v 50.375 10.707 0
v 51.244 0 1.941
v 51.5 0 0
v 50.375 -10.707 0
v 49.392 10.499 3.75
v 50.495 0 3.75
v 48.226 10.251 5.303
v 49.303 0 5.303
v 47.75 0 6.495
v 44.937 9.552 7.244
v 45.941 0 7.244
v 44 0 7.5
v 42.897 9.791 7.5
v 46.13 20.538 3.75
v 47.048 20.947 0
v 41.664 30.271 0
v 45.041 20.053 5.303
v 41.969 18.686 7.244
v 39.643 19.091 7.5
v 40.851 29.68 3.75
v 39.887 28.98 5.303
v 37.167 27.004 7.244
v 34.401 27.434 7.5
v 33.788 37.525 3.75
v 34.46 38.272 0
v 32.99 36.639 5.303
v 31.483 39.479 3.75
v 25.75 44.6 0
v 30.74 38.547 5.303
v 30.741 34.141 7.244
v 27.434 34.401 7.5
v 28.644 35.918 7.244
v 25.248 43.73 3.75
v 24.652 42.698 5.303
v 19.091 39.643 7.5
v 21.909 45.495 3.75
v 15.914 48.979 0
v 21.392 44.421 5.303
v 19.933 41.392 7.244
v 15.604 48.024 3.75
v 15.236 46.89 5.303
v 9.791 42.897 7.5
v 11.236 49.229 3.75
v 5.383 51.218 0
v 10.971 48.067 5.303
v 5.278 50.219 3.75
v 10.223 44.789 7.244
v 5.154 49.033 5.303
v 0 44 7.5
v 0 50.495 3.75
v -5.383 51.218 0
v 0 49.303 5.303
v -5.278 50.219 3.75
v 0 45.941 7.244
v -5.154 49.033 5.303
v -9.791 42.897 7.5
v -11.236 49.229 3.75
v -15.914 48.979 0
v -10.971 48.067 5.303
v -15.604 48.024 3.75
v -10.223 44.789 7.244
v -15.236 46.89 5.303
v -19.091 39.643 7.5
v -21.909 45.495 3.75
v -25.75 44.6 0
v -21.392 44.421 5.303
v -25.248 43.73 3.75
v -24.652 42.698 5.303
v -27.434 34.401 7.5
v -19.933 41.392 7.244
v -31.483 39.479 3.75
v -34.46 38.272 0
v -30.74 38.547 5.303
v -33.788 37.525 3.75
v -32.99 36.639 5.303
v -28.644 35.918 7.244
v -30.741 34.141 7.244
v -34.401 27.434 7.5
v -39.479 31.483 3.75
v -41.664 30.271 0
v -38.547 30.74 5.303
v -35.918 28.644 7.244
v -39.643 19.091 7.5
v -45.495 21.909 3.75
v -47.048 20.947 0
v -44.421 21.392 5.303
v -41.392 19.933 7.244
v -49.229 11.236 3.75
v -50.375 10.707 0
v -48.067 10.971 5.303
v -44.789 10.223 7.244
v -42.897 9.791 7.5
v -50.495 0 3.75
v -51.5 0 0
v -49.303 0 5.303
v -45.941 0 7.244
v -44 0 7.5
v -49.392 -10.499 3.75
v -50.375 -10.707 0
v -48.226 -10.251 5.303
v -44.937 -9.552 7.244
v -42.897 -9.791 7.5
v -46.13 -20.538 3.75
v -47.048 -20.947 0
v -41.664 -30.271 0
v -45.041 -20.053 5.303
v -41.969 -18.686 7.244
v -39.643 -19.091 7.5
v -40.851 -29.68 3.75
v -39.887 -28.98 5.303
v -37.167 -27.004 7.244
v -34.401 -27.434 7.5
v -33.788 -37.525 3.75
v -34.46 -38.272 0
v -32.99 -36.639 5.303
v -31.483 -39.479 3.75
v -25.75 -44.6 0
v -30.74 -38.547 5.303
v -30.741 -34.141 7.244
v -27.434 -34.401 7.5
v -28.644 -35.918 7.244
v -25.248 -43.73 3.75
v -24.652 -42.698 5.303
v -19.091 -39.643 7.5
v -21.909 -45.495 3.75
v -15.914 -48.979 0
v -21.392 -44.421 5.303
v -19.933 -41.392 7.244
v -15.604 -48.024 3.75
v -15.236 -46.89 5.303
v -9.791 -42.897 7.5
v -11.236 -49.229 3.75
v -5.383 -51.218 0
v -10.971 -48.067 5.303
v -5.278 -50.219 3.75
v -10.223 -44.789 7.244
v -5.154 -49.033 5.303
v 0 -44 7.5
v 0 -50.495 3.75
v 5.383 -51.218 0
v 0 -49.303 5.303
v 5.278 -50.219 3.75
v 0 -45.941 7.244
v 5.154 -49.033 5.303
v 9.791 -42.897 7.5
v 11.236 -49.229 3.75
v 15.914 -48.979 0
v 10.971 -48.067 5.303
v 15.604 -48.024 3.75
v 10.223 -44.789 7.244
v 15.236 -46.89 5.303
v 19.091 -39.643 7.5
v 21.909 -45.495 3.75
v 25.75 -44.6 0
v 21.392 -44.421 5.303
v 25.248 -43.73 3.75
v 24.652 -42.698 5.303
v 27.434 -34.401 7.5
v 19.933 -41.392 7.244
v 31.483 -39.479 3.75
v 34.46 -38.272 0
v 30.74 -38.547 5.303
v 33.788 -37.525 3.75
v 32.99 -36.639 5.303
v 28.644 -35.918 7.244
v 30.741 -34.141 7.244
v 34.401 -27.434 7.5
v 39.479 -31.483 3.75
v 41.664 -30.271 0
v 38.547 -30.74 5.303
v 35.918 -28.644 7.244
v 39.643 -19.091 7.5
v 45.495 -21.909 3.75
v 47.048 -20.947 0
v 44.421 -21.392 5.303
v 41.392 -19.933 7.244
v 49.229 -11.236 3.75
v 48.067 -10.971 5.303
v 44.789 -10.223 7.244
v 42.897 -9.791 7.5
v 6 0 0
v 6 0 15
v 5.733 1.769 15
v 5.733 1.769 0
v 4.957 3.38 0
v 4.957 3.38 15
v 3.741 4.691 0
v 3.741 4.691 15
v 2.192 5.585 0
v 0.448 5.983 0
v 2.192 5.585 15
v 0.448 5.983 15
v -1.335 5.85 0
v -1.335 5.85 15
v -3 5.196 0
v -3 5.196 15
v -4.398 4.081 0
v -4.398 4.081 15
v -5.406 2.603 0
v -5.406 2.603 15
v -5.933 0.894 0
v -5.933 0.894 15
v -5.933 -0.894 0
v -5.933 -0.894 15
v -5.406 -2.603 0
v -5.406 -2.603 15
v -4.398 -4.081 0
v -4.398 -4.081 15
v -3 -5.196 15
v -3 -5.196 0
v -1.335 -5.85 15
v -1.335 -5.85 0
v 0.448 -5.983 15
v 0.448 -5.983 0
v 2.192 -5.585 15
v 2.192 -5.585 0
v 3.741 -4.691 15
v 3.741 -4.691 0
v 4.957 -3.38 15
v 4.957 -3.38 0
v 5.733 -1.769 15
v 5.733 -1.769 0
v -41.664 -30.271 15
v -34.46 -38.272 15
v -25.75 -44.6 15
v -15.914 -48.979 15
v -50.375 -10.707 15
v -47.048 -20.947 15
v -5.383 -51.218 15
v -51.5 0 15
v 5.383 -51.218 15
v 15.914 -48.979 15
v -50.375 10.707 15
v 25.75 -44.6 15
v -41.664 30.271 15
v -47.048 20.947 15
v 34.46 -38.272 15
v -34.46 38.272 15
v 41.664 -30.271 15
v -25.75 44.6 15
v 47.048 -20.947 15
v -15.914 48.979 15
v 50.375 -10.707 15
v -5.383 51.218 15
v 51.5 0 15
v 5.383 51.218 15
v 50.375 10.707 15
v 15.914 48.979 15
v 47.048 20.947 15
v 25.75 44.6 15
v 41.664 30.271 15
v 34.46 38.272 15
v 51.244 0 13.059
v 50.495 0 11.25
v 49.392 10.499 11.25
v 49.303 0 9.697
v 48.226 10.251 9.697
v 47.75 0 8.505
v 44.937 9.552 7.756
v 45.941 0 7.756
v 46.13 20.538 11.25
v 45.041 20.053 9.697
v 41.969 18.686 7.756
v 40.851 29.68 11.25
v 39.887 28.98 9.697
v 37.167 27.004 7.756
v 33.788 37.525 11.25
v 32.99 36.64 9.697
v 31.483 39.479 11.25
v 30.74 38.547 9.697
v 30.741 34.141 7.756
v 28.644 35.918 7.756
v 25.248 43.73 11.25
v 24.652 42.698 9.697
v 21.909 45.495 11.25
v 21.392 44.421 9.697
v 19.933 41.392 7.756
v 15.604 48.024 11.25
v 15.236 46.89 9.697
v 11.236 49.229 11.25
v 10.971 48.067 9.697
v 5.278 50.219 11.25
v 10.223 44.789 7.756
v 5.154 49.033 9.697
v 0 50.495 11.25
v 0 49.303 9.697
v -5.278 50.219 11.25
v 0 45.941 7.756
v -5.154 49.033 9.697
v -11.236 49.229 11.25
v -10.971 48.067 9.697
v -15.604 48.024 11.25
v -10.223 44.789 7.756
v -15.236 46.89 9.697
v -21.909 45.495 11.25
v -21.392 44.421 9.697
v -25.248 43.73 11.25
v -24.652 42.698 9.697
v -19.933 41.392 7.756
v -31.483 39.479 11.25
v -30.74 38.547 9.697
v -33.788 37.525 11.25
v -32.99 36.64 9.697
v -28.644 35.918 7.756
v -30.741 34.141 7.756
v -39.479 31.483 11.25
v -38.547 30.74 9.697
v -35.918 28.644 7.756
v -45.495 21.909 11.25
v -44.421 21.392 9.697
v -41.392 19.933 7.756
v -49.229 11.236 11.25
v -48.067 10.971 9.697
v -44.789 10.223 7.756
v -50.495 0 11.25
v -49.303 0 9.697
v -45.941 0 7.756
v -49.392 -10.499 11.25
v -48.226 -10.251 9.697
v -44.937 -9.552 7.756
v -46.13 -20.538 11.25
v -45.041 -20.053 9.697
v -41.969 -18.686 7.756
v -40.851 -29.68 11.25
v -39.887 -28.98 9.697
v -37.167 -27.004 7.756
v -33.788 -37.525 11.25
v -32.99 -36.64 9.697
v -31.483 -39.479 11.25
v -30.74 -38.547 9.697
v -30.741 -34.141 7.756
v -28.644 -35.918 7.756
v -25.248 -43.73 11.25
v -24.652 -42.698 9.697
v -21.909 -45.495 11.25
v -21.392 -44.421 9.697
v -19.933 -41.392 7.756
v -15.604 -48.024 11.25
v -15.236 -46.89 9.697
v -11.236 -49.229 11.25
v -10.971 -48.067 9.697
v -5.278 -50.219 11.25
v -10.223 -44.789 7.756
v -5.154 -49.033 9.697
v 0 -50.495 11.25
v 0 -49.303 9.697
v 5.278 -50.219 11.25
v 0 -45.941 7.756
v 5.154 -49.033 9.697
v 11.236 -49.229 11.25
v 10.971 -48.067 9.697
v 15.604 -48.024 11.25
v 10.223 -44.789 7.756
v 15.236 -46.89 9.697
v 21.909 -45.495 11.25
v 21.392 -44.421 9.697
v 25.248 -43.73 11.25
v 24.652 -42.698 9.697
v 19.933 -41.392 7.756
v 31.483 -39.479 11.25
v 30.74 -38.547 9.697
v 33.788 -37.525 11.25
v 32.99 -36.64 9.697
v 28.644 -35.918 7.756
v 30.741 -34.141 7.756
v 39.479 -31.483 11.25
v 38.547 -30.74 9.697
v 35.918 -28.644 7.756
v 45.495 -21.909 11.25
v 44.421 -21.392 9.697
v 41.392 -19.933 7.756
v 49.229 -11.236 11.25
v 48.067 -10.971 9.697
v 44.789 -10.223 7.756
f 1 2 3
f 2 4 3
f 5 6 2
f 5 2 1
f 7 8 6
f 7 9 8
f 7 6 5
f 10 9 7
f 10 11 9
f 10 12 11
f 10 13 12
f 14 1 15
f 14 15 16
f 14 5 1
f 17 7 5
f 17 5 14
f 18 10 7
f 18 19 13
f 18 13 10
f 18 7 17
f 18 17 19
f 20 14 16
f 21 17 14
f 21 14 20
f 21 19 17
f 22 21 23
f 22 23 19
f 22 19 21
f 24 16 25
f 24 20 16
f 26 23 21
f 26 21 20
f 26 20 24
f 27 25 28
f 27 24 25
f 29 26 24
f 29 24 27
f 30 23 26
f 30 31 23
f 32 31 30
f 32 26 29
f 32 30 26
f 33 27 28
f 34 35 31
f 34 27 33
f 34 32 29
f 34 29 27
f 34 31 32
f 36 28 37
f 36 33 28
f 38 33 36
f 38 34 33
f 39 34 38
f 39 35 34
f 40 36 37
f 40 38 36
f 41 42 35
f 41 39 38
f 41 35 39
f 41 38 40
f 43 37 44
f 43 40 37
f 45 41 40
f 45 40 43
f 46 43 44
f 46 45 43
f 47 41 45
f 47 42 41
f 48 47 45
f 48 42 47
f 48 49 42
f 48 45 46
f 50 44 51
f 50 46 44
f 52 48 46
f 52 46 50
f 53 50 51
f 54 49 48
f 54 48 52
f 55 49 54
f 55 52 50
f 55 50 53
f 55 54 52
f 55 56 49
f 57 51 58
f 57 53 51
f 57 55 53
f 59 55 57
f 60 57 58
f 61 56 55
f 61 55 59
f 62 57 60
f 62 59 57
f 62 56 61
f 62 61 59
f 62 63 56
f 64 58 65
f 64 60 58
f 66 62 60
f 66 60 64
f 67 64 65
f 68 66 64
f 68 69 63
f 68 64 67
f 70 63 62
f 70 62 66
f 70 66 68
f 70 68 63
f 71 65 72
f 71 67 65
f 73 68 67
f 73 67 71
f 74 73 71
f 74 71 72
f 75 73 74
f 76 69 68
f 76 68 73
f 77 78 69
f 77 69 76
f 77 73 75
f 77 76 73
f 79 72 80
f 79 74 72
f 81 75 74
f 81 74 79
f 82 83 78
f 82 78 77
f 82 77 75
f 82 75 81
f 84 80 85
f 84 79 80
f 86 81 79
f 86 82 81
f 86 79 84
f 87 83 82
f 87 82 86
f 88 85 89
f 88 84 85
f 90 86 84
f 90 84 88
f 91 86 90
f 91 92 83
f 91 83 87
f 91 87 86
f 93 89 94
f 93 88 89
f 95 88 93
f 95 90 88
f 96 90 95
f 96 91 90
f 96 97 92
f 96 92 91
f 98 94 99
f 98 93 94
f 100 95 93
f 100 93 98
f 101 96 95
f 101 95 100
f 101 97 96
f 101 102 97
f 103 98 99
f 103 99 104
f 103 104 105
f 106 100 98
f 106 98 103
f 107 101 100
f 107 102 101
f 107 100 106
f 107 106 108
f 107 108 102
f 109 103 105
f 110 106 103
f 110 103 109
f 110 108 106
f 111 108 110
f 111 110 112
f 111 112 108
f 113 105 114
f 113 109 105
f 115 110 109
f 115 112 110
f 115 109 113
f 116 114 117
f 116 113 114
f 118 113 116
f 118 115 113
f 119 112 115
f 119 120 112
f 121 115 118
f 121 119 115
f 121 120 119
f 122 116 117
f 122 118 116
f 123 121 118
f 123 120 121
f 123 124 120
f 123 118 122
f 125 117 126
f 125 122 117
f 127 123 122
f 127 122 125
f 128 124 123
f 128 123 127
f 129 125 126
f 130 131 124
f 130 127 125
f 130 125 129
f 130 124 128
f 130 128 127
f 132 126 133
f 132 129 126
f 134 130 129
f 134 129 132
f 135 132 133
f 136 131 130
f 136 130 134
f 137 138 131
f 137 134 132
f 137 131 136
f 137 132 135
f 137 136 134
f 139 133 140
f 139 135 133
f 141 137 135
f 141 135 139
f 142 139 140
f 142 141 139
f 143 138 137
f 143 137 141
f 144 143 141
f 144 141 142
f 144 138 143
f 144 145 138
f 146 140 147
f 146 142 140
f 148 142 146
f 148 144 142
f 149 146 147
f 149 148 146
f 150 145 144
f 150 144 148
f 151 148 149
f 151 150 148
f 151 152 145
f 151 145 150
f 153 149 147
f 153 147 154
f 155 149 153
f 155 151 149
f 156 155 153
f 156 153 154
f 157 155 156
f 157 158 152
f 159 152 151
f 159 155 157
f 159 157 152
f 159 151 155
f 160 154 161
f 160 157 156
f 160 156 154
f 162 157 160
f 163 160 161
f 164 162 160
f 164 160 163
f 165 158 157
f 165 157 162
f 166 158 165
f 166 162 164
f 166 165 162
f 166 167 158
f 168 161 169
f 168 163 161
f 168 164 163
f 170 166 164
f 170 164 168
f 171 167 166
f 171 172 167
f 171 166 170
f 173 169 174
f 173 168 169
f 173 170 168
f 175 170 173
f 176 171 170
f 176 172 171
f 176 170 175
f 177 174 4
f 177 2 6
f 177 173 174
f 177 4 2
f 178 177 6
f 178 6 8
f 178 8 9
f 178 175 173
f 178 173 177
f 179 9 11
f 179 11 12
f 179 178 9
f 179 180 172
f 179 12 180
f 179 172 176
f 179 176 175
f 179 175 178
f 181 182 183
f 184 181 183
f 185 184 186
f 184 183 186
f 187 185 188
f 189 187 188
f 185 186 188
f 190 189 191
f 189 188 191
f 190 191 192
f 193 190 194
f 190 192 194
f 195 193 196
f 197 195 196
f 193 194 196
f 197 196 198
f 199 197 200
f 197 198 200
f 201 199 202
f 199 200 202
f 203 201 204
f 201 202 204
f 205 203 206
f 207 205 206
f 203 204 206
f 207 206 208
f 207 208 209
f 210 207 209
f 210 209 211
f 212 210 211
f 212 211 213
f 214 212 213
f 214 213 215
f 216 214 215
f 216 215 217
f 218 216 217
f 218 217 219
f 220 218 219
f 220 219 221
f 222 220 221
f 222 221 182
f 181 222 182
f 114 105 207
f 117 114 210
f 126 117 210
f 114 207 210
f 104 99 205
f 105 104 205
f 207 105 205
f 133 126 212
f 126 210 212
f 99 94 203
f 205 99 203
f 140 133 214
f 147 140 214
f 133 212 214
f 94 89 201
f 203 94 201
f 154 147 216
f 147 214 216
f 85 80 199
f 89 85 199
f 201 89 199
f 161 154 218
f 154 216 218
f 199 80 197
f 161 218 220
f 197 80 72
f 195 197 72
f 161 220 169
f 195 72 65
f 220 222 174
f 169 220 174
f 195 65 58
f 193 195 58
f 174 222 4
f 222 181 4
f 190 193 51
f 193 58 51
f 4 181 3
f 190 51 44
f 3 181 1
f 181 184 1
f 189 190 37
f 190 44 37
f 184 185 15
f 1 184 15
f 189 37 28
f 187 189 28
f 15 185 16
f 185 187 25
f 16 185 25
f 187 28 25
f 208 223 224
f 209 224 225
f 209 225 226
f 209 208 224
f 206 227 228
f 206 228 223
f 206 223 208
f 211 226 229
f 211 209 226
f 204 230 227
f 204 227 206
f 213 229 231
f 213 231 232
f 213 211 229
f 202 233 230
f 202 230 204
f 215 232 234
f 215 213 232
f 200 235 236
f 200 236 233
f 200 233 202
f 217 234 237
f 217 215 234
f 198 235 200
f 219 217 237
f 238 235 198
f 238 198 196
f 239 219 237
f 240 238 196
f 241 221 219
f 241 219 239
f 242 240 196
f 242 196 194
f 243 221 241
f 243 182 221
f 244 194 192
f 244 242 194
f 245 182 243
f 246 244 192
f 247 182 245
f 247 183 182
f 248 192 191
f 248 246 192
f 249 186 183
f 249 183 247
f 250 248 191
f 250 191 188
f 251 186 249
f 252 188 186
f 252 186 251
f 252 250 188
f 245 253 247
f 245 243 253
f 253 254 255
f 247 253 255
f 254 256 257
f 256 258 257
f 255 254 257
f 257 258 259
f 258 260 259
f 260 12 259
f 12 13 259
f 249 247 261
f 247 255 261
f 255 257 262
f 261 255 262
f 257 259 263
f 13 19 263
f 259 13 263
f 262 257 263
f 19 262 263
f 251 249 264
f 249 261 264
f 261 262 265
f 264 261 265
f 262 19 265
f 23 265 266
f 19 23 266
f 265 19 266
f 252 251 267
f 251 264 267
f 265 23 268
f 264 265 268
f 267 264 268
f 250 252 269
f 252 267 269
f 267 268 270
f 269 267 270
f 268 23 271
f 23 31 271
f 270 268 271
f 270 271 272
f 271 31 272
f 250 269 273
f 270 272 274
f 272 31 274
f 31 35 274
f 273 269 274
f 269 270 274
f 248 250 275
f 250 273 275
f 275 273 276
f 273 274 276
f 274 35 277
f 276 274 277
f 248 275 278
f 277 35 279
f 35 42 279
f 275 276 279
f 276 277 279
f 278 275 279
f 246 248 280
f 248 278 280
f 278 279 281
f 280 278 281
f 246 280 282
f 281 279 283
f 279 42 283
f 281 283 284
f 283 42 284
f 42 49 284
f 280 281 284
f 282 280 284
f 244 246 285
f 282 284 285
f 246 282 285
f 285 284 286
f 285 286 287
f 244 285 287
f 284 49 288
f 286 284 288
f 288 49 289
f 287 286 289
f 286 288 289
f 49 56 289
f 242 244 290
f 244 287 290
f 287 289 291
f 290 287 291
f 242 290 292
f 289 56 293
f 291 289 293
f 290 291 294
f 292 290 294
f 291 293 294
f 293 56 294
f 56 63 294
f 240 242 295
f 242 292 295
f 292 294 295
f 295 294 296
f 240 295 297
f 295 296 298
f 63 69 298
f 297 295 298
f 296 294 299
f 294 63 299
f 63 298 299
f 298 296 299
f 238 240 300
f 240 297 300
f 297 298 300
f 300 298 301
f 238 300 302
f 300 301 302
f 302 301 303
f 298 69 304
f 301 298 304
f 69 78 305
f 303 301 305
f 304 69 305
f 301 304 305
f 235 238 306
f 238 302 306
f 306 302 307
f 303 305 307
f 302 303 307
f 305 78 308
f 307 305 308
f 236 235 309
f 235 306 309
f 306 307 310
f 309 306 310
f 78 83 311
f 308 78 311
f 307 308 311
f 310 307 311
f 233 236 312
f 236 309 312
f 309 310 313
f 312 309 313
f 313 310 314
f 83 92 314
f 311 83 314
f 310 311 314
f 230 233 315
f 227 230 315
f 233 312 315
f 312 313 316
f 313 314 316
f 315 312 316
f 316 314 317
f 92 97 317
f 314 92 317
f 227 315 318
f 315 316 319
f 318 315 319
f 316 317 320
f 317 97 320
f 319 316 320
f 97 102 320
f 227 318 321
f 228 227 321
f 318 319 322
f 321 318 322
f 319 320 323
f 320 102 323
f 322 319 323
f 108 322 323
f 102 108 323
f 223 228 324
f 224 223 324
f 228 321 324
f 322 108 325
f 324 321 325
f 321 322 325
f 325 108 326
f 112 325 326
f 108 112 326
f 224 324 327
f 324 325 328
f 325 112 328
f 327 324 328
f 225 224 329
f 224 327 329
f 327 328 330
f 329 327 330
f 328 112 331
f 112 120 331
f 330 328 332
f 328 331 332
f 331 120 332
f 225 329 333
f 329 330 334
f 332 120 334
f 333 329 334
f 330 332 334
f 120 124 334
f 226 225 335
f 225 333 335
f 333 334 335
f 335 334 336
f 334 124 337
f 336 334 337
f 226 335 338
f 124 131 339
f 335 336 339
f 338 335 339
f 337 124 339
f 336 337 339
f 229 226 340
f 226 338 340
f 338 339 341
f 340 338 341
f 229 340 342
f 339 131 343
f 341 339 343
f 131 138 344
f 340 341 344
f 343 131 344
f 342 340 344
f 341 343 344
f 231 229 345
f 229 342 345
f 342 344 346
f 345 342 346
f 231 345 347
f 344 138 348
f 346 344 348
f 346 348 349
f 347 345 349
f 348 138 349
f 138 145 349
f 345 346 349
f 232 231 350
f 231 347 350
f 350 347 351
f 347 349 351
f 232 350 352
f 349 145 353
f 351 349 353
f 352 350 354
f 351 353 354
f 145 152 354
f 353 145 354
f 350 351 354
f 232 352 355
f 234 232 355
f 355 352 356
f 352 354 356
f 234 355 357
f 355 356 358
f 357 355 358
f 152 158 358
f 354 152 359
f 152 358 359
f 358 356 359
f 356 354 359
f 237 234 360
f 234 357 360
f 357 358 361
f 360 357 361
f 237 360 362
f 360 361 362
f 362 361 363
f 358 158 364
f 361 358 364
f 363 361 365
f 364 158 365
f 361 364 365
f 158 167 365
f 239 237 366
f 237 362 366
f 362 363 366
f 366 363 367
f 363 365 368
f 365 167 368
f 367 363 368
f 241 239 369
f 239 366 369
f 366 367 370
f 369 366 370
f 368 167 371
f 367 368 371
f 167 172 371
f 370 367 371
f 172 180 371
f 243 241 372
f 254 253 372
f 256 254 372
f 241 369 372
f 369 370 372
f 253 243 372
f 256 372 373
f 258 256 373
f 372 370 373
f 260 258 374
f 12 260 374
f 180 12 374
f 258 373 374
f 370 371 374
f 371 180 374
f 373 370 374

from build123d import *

# Parameters (mm, degrees)
F0_R     = 51.5
F1_DEPTH = 7.5
F2_R     = 7.49999
F3_R     = 51.5
F3_R_2   = 44.00001
F4_DEPTH = 7.5
F5_R     = 7.4999
F6_R     = 6
F7_DEPTH = 25


# Not quite as in the source:
# - a fillet or chamfer is up to 0.001 mm smaller than in the source, because OpenCascade refuses the exact size


with BuildPart() as f1:
    # F0 (on Top) → F1 (new body)
    with BuildSketch(Plane.XY):
        Circle(F0_R)
    extrude(amount=F1_DEPTH)

    # F2 (radius 7.5 in the source; OpenCascade refuses exactly that, so slightly less here)
    f2_edges = [f1.edges().sort_by_distance(p)[0] for p in [
        (-51.5, 0, 7.5),
    ]]
    fillet(f2_edges, radius=F2_R)

    # F3 (on face) → F4 (join)
    with BuildSketch(Plane.XY.offset(7.5)):
        Circle(F3_R)
        Circle(F3_R_2, mode=Mode.SUBTRACT)
        Circle(F3_R_2)
    extrude(amount=F4_DEPTH)

    # F5 (radius 7.5 in the source; OpenCascade refuses exactly that, so slightly less here)
    f5_edges = [f1.edges().sort_by_distance(p)[0] for p in [
        (-51.5, 0, 7.5),
    ]]
    fillet(f5_edges, radius=F5_R)

    # F6 (on face) → F7 (cut)
    with BuildSketch(Plane.XY.offset(15)):
        Circle(F6_R)
    extrude(amount=-F7_DEPTH, mode=Mode.SUBTRACT)


solid = f1.part
